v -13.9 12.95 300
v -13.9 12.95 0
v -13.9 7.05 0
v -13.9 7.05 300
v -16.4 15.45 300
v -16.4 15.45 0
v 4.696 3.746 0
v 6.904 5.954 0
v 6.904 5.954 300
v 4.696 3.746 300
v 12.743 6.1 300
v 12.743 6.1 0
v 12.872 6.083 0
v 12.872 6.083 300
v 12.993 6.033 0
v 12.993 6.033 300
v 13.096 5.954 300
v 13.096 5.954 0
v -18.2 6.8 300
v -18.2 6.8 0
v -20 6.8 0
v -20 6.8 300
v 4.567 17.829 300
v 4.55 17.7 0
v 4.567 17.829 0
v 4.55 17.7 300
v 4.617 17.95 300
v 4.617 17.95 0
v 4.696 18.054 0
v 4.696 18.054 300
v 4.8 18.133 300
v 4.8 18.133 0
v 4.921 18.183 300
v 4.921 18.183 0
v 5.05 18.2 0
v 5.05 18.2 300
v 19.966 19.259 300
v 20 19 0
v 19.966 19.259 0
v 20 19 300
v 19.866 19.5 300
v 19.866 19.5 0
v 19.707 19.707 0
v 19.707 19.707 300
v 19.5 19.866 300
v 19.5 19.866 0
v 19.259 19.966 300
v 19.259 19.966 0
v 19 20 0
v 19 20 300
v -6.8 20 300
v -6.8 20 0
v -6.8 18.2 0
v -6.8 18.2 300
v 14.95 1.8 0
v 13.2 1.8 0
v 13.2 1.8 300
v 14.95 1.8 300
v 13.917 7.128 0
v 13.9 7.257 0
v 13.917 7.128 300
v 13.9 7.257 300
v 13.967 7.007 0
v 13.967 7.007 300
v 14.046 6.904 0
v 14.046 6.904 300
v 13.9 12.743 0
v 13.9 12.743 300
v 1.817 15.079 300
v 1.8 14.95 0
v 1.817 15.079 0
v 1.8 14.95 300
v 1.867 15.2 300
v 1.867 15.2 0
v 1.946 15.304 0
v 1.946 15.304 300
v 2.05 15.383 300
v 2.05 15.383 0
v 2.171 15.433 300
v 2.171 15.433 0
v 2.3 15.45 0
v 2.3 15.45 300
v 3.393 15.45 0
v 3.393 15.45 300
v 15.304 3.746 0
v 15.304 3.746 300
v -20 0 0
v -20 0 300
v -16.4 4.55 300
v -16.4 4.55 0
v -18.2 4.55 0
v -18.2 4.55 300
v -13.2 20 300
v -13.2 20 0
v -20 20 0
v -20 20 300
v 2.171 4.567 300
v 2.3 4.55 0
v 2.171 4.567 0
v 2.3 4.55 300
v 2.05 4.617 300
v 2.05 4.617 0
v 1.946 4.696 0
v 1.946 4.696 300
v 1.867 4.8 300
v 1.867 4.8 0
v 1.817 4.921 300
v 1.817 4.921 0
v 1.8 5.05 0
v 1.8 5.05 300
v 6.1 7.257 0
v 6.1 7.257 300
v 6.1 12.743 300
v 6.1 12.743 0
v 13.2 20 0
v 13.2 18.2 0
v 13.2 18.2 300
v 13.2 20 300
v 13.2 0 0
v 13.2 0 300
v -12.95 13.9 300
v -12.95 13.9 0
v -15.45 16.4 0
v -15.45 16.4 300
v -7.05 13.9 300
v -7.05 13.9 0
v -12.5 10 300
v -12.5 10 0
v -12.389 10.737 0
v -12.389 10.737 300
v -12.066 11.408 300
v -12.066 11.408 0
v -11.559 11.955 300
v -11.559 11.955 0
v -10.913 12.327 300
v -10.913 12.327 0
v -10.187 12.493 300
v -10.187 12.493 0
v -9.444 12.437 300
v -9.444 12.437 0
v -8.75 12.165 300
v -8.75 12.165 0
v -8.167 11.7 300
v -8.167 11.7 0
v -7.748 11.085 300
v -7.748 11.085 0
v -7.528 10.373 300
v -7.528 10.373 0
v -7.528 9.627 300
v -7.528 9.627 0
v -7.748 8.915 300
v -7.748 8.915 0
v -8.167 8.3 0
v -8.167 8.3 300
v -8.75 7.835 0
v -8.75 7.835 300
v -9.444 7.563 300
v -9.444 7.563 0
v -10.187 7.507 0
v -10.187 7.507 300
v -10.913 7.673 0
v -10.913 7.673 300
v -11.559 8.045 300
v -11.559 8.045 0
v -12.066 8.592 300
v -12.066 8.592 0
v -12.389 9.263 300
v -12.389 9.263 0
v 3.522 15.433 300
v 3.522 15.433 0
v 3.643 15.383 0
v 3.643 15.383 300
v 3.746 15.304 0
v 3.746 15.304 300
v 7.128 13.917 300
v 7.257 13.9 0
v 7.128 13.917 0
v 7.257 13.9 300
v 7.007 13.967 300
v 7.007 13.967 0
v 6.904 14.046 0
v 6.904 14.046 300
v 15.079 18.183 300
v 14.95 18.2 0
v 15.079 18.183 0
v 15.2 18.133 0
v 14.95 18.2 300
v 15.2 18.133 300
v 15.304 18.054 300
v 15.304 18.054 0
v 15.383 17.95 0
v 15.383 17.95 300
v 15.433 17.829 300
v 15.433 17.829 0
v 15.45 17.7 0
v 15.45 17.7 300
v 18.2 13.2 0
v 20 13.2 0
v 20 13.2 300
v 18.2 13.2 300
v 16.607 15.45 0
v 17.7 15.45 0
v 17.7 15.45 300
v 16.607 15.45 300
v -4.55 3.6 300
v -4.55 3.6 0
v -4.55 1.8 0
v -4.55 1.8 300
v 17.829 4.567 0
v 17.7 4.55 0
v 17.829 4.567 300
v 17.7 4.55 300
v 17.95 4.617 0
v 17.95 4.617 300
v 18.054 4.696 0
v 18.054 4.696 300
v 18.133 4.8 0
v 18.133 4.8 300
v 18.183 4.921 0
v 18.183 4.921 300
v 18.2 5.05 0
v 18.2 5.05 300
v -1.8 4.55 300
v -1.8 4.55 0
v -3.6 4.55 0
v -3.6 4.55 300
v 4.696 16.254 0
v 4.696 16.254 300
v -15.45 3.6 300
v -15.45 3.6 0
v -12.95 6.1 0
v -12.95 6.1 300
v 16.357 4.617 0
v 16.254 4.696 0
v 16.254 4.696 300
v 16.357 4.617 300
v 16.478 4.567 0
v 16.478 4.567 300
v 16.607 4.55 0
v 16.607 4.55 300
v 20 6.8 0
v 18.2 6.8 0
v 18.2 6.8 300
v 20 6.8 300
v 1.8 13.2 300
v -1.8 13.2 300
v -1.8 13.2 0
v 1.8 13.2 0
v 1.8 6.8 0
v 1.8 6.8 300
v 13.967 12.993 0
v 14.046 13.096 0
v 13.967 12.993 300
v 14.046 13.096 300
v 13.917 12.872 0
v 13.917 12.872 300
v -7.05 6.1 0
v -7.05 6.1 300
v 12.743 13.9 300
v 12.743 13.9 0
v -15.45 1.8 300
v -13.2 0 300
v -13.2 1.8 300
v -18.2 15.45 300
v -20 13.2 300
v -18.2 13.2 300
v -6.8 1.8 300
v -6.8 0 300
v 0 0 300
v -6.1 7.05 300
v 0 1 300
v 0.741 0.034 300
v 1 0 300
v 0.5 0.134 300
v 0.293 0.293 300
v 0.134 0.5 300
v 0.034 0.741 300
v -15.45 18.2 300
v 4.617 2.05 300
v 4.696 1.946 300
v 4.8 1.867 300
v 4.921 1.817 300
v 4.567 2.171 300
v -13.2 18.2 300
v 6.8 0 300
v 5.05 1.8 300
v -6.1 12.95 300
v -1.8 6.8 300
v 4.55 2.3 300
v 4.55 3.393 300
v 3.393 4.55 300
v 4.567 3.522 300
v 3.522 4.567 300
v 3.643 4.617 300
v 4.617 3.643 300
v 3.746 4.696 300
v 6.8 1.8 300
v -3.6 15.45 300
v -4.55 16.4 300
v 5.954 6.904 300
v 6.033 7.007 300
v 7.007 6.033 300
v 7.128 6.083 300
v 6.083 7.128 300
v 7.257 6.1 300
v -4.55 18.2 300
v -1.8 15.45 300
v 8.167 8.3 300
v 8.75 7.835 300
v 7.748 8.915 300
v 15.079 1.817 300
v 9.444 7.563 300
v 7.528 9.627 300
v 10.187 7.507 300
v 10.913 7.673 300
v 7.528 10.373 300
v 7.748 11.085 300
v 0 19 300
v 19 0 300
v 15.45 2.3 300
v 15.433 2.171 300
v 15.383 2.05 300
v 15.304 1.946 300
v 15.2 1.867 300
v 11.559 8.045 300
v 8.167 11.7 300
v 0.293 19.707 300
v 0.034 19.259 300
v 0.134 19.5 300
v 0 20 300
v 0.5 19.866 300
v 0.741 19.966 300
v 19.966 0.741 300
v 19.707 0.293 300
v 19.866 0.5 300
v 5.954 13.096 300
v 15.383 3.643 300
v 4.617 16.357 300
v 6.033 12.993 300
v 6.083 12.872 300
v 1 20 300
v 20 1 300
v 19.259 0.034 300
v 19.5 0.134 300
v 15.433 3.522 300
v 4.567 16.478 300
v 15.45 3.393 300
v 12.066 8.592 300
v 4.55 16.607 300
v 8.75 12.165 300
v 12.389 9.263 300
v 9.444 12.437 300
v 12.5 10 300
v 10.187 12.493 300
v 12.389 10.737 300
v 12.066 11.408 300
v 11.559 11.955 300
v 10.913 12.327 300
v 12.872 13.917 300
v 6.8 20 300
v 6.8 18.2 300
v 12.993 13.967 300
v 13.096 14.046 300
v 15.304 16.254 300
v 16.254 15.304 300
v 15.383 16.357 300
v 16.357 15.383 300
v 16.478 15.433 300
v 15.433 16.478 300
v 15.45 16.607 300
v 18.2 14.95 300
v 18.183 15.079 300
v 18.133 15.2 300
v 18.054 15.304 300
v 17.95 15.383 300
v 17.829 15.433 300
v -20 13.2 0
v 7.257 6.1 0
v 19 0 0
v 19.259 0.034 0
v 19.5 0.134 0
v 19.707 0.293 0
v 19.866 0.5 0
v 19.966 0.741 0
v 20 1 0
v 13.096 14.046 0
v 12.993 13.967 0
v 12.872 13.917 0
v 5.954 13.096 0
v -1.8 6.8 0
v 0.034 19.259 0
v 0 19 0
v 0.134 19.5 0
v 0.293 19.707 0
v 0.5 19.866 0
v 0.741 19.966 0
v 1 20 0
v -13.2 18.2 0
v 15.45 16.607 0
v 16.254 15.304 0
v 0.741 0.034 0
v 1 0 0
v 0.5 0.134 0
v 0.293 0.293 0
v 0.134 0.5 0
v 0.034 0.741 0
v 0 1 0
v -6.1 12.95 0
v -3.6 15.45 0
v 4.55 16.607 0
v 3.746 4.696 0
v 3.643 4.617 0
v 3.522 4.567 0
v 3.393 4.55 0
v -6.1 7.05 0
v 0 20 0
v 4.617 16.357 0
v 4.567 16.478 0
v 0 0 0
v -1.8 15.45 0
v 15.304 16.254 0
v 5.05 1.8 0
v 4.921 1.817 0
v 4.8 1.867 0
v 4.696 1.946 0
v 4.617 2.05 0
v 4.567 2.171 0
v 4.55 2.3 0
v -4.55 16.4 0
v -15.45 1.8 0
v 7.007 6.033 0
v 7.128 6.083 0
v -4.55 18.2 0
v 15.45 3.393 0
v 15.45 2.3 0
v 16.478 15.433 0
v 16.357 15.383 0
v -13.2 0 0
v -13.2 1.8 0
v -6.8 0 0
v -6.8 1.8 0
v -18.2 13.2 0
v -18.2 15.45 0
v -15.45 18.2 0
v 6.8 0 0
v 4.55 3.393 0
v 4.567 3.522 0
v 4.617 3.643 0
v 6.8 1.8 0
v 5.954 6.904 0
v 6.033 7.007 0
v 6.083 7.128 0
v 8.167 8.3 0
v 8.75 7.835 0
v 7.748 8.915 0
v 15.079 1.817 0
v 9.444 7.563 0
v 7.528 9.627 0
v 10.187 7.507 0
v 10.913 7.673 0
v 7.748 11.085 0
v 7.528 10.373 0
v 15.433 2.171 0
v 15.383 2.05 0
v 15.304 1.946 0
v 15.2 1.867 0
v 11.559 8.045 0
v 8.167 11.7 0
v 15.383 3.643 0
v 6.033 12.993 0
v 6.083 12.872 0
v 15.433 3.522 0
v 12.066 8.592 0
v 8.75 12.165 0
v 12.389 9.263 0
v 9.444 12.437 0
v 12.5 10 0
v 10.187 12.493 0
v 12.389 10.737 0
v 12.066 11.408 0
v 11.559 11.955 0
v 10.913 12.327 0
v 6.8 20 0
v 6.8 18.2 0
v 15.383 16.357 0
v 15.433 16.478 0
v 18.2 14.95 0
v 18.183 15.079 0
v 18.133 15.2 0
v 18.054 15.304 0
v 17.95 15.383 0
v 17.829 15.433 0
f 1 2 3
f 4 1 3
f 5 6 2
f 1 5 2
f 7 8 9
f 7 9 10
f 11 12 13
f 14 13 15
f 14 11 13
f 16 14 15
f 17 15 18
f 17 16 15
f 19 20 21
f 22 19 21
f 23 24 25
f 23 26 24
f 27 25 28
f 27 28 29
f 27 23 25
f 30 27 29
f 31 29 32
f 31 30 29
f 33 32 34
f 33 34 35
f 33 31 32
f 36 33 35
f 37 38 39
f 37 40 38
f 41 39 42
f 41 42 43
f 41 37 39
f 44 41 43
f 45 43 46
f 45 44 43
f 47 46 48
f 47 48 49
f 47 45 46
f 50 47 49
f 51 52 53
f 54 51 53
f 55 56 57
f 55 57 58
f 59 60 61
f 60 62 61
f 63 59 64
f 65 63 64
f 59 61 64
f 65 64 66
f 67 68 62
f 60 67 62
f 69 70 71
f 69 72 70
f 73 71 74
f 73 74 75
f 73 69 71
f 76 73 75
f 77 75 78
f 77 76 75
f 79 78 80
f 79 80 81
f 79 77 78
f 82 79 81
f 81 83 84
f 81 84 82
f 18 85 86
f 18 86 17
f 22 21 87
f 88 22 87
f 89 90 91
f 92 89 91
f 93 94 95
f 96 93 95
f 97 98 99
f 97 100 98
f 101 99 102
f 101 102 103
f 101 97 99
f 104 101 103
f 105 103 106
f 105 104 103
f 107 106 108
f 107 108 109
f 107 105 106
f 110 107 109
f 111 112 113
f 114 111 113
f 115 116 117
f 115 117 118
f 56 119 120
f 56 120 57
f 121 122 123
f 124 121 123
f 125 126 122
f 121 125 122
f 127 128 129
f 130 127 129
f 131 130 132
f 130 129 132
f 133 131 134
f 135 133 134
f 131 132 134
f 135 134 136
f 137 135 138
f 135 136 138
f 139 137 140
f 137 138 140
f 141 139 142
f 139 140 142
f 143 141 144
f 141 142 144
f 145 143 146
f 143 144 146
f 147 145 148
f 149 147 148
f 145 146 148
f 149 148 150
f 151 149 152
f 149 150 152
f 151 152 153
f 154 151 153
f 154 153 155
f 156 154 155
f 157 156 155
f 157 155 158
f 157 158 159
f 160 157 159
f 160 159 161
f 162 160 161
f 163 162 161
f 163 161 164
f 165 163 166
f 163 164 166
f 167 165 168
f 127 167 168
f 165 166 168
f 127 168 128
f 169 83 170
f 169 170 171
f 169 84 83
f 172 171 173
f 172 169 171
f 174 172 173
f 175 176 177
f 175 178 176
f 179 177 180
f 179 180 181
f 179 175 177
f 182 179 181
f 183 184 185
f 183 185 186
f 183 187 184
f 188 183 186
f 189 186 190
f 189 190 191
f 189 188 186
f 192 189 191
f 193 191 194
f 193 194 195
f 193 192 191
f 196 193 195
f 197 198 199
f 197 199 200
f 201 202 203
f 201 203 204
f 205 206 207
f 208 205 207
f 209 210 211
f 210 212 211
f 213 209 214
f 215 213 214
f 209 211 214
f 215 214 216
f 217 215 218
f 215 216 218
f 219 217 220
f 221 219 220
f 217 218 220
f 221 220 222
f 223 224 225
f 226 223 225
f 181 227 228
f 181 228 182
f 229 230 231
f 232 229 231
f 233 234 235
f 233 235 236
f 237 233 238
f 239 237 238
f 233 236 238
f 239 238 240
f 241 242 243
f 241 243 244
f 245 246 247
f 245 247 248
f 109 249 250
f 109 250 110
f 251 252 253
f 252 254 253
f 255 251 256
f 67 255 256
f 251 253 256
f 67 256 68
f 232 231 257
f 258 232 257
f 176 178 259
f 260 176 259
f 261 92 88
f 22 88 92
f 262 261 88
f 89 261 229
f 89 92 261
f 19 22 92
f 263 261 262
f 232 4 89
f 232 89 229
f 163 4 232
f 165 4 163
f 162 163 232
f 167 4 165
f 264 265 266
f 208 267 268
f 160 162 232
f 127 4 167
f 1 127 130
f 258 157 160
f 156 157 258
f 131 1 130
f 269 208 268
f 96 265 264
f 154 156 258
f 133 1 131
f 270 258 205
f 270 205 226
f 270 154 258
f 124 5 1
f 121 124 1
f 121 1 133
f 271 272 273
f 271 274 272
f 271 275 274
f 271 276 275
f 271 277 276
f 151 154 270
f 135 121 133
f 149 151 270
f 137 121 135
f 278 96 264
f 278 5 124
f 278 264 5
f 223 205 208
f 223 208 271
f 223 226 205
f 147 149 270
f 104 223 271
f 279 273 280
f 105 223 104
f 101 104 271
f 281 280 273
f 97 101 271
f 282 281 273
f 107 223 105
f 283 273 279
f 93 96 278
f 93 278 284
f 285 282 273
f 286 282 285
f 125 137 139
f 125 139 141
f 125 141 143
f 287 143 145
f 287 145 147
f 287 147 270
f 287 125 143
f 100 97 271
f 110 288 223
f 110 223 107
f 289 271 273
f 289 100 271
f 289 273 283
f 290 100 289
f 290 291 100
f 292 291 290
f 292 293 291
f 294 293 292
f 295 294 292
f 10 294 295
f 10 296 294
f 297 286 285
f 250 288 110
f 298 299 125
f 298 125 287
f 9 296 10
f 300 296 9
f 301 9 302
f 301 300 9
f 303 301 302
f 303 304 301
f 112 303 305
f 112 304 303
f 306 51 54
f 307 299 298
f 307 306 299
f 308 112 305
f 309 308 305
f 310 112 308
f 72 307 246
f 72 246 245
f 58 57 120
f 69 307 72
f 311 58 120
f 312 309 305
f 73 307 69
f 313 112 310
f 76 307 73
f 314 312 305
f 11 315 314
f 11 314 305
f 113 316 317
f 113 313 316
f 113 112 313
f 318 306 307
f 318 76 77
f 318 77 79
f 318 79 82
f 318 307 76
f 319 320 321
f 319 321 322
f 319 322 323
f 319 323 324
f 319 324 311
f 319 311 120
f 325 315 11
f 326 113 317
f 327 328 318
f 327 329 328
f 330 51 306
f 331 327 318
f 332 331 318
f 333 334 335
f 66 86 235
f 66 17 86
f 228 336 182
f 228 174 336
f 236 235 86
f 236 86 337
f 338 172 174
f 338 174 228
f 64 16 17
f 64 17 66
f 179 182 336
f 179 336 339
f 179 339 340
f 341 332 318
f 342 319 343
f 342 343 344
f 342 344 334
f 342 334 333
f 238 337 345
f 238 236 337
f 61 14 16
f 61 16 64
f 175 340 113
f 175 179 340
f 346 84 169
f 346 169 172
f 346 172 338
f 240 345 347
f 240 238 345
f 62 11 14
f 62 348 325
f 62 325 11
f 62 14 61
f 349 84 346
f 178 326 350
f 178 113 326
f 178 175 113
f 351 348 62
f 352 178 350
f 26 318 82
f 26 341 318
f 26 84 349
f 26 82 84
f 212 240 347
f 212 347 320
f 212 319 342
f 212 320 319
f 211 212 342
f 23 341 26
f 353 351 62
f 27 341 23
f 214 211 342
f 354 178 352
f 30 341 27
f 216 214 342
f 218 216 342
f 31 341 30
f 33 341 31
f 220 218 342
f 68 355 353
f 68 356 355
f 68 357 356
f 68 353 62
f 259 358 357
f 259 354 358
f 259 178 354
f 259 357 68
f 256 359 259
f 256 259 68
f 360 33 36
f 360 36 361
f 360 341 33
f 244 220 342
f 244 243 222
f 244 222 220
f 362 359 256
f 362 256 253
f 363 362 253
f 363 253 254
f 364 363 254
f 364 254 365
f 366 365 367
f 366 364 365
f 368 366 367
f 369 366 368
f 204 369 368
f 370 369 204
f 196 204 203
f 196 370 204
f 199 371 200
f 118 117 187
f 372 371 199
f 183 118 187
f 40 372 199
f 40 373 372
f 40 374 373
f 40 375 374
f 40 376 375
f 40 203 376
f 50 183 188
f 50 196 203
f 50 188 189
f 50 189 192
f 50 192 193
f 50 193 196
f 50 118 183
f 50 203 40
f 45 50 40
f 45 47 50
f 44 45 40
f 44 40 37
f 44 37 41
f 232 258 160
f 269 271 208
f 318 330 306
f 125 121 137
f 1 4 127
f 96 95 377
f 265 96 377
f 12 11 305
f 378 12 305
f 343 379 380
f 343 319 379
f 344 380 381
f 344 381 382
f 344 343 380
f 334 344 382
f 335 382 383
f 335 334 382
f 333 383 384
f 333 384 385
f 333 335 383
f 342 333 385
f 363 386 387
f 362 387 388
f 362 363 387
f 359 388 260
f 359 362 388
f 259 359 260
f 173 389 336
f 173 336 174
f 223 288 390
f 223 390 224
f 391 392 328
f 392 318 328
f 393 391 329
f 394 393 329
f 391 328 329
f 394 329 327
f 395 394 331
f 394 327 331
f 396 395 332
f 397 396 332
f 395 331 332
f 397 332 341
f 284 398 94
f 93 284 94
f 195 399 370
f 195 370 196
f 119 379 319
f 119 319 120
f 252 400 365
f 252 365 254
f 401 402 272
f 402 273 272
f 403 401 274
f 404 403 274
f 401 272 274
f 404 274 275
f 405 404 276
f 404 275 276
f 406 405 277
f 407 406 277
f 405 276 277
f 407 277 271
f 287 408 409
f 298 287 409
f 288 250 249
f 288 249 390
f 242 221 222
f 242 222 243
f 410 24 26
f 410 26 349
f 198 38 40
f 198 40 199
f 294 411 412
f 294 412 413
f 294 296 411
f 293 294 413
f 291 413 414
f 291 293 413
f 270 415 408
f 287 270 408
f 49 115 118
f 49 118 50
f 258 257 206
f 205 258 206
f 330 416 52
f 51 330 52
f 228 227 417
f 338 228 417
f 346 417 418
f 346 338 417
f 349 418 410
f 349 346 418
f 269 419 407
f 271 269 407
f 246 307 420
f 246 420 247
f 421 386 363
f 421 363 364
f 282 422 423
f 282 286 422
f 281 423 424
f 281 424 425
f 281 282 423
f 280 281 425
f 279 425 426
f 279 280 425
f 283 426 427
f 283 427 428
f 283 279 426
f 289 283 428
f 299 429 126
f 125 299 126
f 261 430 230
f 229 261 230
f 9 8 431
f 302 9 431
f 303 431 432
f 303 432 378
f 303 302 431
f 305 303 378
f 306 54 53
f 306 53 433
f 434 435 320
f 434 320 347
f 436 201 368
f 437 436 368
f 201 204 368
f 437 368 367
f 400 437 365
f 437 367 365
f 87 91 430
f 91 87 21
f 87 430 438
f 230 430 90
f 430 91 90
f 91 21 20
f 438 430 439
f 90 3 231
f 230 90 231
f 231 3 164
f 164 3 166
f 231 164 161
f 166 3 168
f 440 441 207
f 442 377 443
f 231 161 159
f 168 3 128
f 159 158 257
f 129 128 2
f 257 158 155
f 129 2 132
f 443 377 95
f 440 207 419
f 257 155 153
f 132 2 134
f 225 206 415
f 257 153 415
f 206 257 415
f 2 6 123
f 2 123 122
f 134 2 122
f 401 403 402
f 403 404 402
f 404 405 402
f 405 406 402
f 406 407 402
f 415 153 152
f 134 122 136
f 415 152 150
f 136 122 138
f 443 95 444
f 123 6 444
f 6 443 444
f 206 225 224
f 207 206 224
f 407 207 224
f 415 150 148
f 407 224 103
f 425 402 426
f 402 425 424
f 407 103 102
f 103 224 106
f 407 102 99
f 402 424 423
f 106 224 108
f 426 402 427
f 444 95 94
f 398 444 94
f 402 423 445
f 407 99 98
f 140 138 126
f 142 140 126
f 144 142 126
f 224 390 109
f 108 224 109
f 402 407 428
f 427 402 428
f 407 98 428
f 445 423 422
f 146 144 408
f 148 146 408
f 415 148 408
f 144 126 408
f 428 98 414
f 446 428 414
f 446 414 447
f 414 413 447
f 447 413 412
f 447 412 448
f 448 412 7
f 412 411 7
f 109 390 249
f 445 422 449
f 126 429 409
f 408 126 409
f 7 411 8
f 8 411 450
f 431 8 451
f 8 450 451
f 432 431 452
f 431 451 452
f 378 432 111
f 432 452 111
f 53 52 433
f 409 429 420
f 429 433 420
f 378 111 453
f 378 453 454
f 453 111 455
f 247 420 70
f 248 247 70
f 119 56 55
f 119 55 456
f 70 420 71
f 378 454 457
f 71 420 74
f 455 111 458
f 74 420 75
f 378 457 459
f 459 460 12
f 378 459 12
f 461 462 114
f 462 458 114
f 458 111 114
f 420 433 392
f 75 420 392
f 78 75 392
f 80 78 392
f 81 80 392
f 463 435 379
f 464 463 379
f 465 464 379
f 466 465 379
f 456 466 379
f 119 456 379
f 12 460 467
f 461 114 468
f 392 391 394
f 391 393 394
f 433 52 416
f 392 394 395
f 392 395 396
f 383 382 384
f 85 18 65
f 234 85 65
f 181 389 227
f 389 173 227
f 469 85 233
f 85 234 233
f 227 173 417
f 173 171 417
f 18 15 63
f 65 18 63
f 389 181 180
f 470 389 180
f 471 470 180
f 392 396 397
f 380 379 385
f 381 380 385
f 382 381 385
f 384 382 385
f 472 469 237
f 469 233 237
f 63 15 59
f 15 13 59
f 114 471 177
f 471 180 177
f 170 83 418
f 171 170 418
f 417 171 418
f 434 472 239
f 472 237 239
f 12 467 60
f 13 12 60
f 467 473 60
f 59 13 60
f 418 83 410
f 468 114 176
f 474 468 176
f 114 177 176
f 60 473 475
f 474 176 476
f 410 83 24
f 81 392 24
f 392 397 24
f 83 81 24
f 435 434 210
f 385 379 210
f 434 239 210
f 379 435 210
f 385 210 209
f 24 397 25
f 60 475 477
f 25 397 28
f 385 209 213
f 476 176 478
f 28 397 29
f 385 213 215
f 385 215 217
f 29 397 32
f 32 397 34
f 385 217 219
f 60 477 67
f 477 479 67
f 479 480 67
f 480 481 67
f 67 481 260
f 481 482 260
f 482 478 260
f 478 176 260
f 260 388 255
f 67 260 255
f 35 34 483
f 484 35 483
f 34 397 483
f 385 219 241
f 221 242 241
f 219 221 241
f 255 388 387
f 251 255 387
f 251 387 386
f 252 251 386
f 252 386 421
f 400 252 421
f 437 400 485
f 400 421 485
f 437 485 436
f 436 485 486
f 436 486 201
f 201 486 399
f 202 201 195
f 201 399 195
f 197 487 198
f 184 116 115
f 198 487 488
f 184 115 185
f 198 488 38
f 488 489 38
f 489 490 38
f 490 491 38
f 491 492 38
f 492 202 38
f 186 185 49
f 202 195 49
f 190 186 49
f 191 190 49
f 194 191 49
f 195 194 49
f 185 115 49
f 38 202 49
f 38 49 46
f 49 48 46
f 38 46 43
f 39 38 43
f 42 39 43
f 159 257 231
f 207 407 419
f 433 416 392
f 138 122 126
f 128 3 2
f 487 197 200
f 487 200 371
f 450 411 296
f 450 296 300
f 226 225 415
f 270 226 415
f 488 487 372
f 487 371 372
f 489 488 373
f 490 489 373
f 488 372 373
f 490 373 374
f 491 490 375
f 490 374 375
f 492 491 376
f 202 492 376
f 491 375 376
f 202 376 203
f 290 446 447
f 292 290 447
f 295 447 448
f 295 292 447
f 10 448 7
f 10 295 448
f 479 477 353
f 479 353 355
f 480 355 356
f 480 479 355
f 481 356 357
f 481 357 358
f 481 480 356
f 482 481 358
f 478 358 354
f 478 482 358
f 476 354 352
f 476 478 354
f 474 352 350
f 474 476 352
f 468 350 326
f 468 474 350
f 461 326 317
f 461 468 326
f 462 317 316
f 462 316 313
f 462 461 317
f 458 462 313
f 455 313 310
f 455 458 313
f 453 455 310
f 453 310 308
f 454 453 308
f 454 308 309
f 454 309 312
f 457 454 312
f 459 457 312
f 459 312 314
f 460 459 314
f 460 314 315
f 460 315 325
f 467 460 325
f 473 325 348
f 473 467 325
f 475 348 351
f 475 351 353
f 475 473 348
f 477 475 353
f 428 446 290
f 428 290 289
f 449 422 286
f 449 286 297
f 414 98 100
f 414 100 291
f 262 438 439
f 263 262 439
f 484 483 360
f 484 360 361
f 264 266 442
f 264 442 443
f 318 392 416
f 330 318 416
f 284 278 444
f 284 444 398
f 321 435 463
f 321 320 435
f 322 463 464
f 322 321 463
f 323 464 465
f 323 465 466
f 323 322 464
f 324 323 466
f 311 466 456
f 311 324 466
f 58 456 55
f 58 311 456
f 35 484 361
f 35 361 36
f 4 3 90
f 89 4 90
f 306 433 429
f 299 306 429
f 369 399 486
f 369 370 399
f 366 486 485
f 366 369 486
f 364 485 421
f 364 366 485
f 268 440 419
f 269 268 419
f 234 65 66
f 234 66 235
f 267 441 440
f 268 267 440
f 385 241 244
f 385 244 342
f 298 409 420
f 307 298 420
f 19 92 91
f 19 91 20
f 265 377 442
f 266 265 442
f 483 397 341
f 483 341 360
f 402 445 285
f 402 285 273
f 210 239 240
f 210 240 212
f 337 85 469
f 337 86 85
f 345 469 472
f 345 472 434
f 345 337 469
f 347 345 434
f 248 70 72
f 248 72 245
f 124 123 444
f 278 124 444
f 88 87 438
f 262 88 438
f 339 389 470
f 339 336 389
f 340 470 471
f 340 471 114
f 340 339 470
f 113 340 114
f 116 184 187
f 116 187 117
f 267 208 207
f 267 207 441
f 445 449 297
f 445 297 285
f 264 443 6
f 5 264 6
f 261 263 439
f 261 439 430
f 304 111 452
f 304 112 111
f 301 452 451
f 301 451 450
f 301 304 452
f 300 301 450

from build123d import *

# Parameters (mm, degrees)
SKETCH1_R           = 2.5
BOSS_EXTRUDE1_DEPTH = 300
FILLET1_R           = 1
FILLET2_R           = 0.5
FILLET3_R           = 0.5
FILLET4_R           = 0.5
FILLET5_R           = 0.5


with BuildPart() as part:
    # Sketch1 → Boss-Extrude1 (new body)
    with BuildSketch(Plane.XY):
        Polygon((13.2, 0), (13.2, 1.8), (15.45, 1.8), (15.45, 3.6), (12.95, 6.1), (7.05, 6.1), (4.55, 3.6), (4.55, 1.8), (6.8, 1.8), (6.8, 0), (0, 0), (0, 6.8), (1.8, 6.8), (1.8, 4.55), (3.6, 4.55), (6.1, 7.05), (6.1, 12.95), (3.6, 15.45), (1.8, 15.45), (1.8, 13.2), (0, 13.2), (0, 20), (6.8, 20), (6.8, 18.2), (4.55, 18.2), (4.55, 16.4), (7.05, 13.9), (12.95, 13.9), (15.45, 16.4), (15.45, 18.2), (13.2, 18.2), (13.2, 20), (20, 20), (20, 13.2), (18.2, 13.2), (18.2, 15.45), (16.4, 15.45), (13.9, 12.95), (13.9, 7.05), (16.4, 4.55), (18.2, 4.55), (18.2, 6.8), (20, 6.8), (20, 0), align=None)
        with Locations((10, 10)):
            Circle(SKETCH1_R, mode=Mode.SUBTRACT)
    boss_extrude1 = extrude(amount=BOSS_EXTRUDE1_DEPTH)

    # Fillet1
    fillet1_edges = [part.edges().sort_by_distance(p)[0] for p in [
        (0, 0, 150),
        (0, 20, 150),
        (20, 20, 150),
        (20, 0, 150),
    ]]
    fillet(fillet1_edges, radius=FILLET1_R)

    # Fillet2
    fillet2_edges = [part.edges().sort_by_distance(p)[0] for p in [
        (4.55, 18.2, 150),
        (4.55, 16.4, 150),
        (7.05, 13.9, 150),
        (12.95, 13.9, 150),
        (15.45, 16.4, 150),
        (15.45, 18.2, 150),
    ]]
    fillet(fillet2_edges, radius=FILLET2_R)

    # Fillet3
    fillet3_edges = [part.edges().sort_by_distance(p)[0] for p in [
        (18.2, 15.45, 150),
        (16.4, 15.45, 150),
        (13.9, 12.95, 150),
        (13.9, 7.05, 150),
        (16.4, 4.55, 150),
        (18.2, 4.55, 150),
    ]]
    fillet(fillet3_edges, radius=FILLET3_R)

    # Fillet4
    fillet4_edges = [part.edges().sort_by_distance(p)[0] for p in [
        (1.8, 4.55, 150),
        (3.6, 4.55, 150),
        (6.1, 7.05, 150),
        (6.1, 12.95, 150),
        (3.6, 15.45, 150),
        (1.8, 15.45, 150),
    ]]
    fillet(fillet4_edges, radius=FILLET4_R)

    # Fillet5
    fillet5_edges = [part.edges().sort_by_distance(p)[0] for p in [
        (15.45, 1.8, 150),
        (15.45, 3.6, 150),
        (12.95, 6.1, 150),
        (7.05, 6.1, 150),
        (4.55, 3.6, 150),
        (4.55, 1.8, 150),
    ]]
    fillet(fillet5_edges, radius=FILLET5_R)

    # Mirror1: Boss-Extrude1 across plane
    add(boss_extrude1.mirror(Plane(origin=(0, 0, 0), x_dir=(0, 0, 1), z_dir=(1, 0, 0))))


solid = part.part
